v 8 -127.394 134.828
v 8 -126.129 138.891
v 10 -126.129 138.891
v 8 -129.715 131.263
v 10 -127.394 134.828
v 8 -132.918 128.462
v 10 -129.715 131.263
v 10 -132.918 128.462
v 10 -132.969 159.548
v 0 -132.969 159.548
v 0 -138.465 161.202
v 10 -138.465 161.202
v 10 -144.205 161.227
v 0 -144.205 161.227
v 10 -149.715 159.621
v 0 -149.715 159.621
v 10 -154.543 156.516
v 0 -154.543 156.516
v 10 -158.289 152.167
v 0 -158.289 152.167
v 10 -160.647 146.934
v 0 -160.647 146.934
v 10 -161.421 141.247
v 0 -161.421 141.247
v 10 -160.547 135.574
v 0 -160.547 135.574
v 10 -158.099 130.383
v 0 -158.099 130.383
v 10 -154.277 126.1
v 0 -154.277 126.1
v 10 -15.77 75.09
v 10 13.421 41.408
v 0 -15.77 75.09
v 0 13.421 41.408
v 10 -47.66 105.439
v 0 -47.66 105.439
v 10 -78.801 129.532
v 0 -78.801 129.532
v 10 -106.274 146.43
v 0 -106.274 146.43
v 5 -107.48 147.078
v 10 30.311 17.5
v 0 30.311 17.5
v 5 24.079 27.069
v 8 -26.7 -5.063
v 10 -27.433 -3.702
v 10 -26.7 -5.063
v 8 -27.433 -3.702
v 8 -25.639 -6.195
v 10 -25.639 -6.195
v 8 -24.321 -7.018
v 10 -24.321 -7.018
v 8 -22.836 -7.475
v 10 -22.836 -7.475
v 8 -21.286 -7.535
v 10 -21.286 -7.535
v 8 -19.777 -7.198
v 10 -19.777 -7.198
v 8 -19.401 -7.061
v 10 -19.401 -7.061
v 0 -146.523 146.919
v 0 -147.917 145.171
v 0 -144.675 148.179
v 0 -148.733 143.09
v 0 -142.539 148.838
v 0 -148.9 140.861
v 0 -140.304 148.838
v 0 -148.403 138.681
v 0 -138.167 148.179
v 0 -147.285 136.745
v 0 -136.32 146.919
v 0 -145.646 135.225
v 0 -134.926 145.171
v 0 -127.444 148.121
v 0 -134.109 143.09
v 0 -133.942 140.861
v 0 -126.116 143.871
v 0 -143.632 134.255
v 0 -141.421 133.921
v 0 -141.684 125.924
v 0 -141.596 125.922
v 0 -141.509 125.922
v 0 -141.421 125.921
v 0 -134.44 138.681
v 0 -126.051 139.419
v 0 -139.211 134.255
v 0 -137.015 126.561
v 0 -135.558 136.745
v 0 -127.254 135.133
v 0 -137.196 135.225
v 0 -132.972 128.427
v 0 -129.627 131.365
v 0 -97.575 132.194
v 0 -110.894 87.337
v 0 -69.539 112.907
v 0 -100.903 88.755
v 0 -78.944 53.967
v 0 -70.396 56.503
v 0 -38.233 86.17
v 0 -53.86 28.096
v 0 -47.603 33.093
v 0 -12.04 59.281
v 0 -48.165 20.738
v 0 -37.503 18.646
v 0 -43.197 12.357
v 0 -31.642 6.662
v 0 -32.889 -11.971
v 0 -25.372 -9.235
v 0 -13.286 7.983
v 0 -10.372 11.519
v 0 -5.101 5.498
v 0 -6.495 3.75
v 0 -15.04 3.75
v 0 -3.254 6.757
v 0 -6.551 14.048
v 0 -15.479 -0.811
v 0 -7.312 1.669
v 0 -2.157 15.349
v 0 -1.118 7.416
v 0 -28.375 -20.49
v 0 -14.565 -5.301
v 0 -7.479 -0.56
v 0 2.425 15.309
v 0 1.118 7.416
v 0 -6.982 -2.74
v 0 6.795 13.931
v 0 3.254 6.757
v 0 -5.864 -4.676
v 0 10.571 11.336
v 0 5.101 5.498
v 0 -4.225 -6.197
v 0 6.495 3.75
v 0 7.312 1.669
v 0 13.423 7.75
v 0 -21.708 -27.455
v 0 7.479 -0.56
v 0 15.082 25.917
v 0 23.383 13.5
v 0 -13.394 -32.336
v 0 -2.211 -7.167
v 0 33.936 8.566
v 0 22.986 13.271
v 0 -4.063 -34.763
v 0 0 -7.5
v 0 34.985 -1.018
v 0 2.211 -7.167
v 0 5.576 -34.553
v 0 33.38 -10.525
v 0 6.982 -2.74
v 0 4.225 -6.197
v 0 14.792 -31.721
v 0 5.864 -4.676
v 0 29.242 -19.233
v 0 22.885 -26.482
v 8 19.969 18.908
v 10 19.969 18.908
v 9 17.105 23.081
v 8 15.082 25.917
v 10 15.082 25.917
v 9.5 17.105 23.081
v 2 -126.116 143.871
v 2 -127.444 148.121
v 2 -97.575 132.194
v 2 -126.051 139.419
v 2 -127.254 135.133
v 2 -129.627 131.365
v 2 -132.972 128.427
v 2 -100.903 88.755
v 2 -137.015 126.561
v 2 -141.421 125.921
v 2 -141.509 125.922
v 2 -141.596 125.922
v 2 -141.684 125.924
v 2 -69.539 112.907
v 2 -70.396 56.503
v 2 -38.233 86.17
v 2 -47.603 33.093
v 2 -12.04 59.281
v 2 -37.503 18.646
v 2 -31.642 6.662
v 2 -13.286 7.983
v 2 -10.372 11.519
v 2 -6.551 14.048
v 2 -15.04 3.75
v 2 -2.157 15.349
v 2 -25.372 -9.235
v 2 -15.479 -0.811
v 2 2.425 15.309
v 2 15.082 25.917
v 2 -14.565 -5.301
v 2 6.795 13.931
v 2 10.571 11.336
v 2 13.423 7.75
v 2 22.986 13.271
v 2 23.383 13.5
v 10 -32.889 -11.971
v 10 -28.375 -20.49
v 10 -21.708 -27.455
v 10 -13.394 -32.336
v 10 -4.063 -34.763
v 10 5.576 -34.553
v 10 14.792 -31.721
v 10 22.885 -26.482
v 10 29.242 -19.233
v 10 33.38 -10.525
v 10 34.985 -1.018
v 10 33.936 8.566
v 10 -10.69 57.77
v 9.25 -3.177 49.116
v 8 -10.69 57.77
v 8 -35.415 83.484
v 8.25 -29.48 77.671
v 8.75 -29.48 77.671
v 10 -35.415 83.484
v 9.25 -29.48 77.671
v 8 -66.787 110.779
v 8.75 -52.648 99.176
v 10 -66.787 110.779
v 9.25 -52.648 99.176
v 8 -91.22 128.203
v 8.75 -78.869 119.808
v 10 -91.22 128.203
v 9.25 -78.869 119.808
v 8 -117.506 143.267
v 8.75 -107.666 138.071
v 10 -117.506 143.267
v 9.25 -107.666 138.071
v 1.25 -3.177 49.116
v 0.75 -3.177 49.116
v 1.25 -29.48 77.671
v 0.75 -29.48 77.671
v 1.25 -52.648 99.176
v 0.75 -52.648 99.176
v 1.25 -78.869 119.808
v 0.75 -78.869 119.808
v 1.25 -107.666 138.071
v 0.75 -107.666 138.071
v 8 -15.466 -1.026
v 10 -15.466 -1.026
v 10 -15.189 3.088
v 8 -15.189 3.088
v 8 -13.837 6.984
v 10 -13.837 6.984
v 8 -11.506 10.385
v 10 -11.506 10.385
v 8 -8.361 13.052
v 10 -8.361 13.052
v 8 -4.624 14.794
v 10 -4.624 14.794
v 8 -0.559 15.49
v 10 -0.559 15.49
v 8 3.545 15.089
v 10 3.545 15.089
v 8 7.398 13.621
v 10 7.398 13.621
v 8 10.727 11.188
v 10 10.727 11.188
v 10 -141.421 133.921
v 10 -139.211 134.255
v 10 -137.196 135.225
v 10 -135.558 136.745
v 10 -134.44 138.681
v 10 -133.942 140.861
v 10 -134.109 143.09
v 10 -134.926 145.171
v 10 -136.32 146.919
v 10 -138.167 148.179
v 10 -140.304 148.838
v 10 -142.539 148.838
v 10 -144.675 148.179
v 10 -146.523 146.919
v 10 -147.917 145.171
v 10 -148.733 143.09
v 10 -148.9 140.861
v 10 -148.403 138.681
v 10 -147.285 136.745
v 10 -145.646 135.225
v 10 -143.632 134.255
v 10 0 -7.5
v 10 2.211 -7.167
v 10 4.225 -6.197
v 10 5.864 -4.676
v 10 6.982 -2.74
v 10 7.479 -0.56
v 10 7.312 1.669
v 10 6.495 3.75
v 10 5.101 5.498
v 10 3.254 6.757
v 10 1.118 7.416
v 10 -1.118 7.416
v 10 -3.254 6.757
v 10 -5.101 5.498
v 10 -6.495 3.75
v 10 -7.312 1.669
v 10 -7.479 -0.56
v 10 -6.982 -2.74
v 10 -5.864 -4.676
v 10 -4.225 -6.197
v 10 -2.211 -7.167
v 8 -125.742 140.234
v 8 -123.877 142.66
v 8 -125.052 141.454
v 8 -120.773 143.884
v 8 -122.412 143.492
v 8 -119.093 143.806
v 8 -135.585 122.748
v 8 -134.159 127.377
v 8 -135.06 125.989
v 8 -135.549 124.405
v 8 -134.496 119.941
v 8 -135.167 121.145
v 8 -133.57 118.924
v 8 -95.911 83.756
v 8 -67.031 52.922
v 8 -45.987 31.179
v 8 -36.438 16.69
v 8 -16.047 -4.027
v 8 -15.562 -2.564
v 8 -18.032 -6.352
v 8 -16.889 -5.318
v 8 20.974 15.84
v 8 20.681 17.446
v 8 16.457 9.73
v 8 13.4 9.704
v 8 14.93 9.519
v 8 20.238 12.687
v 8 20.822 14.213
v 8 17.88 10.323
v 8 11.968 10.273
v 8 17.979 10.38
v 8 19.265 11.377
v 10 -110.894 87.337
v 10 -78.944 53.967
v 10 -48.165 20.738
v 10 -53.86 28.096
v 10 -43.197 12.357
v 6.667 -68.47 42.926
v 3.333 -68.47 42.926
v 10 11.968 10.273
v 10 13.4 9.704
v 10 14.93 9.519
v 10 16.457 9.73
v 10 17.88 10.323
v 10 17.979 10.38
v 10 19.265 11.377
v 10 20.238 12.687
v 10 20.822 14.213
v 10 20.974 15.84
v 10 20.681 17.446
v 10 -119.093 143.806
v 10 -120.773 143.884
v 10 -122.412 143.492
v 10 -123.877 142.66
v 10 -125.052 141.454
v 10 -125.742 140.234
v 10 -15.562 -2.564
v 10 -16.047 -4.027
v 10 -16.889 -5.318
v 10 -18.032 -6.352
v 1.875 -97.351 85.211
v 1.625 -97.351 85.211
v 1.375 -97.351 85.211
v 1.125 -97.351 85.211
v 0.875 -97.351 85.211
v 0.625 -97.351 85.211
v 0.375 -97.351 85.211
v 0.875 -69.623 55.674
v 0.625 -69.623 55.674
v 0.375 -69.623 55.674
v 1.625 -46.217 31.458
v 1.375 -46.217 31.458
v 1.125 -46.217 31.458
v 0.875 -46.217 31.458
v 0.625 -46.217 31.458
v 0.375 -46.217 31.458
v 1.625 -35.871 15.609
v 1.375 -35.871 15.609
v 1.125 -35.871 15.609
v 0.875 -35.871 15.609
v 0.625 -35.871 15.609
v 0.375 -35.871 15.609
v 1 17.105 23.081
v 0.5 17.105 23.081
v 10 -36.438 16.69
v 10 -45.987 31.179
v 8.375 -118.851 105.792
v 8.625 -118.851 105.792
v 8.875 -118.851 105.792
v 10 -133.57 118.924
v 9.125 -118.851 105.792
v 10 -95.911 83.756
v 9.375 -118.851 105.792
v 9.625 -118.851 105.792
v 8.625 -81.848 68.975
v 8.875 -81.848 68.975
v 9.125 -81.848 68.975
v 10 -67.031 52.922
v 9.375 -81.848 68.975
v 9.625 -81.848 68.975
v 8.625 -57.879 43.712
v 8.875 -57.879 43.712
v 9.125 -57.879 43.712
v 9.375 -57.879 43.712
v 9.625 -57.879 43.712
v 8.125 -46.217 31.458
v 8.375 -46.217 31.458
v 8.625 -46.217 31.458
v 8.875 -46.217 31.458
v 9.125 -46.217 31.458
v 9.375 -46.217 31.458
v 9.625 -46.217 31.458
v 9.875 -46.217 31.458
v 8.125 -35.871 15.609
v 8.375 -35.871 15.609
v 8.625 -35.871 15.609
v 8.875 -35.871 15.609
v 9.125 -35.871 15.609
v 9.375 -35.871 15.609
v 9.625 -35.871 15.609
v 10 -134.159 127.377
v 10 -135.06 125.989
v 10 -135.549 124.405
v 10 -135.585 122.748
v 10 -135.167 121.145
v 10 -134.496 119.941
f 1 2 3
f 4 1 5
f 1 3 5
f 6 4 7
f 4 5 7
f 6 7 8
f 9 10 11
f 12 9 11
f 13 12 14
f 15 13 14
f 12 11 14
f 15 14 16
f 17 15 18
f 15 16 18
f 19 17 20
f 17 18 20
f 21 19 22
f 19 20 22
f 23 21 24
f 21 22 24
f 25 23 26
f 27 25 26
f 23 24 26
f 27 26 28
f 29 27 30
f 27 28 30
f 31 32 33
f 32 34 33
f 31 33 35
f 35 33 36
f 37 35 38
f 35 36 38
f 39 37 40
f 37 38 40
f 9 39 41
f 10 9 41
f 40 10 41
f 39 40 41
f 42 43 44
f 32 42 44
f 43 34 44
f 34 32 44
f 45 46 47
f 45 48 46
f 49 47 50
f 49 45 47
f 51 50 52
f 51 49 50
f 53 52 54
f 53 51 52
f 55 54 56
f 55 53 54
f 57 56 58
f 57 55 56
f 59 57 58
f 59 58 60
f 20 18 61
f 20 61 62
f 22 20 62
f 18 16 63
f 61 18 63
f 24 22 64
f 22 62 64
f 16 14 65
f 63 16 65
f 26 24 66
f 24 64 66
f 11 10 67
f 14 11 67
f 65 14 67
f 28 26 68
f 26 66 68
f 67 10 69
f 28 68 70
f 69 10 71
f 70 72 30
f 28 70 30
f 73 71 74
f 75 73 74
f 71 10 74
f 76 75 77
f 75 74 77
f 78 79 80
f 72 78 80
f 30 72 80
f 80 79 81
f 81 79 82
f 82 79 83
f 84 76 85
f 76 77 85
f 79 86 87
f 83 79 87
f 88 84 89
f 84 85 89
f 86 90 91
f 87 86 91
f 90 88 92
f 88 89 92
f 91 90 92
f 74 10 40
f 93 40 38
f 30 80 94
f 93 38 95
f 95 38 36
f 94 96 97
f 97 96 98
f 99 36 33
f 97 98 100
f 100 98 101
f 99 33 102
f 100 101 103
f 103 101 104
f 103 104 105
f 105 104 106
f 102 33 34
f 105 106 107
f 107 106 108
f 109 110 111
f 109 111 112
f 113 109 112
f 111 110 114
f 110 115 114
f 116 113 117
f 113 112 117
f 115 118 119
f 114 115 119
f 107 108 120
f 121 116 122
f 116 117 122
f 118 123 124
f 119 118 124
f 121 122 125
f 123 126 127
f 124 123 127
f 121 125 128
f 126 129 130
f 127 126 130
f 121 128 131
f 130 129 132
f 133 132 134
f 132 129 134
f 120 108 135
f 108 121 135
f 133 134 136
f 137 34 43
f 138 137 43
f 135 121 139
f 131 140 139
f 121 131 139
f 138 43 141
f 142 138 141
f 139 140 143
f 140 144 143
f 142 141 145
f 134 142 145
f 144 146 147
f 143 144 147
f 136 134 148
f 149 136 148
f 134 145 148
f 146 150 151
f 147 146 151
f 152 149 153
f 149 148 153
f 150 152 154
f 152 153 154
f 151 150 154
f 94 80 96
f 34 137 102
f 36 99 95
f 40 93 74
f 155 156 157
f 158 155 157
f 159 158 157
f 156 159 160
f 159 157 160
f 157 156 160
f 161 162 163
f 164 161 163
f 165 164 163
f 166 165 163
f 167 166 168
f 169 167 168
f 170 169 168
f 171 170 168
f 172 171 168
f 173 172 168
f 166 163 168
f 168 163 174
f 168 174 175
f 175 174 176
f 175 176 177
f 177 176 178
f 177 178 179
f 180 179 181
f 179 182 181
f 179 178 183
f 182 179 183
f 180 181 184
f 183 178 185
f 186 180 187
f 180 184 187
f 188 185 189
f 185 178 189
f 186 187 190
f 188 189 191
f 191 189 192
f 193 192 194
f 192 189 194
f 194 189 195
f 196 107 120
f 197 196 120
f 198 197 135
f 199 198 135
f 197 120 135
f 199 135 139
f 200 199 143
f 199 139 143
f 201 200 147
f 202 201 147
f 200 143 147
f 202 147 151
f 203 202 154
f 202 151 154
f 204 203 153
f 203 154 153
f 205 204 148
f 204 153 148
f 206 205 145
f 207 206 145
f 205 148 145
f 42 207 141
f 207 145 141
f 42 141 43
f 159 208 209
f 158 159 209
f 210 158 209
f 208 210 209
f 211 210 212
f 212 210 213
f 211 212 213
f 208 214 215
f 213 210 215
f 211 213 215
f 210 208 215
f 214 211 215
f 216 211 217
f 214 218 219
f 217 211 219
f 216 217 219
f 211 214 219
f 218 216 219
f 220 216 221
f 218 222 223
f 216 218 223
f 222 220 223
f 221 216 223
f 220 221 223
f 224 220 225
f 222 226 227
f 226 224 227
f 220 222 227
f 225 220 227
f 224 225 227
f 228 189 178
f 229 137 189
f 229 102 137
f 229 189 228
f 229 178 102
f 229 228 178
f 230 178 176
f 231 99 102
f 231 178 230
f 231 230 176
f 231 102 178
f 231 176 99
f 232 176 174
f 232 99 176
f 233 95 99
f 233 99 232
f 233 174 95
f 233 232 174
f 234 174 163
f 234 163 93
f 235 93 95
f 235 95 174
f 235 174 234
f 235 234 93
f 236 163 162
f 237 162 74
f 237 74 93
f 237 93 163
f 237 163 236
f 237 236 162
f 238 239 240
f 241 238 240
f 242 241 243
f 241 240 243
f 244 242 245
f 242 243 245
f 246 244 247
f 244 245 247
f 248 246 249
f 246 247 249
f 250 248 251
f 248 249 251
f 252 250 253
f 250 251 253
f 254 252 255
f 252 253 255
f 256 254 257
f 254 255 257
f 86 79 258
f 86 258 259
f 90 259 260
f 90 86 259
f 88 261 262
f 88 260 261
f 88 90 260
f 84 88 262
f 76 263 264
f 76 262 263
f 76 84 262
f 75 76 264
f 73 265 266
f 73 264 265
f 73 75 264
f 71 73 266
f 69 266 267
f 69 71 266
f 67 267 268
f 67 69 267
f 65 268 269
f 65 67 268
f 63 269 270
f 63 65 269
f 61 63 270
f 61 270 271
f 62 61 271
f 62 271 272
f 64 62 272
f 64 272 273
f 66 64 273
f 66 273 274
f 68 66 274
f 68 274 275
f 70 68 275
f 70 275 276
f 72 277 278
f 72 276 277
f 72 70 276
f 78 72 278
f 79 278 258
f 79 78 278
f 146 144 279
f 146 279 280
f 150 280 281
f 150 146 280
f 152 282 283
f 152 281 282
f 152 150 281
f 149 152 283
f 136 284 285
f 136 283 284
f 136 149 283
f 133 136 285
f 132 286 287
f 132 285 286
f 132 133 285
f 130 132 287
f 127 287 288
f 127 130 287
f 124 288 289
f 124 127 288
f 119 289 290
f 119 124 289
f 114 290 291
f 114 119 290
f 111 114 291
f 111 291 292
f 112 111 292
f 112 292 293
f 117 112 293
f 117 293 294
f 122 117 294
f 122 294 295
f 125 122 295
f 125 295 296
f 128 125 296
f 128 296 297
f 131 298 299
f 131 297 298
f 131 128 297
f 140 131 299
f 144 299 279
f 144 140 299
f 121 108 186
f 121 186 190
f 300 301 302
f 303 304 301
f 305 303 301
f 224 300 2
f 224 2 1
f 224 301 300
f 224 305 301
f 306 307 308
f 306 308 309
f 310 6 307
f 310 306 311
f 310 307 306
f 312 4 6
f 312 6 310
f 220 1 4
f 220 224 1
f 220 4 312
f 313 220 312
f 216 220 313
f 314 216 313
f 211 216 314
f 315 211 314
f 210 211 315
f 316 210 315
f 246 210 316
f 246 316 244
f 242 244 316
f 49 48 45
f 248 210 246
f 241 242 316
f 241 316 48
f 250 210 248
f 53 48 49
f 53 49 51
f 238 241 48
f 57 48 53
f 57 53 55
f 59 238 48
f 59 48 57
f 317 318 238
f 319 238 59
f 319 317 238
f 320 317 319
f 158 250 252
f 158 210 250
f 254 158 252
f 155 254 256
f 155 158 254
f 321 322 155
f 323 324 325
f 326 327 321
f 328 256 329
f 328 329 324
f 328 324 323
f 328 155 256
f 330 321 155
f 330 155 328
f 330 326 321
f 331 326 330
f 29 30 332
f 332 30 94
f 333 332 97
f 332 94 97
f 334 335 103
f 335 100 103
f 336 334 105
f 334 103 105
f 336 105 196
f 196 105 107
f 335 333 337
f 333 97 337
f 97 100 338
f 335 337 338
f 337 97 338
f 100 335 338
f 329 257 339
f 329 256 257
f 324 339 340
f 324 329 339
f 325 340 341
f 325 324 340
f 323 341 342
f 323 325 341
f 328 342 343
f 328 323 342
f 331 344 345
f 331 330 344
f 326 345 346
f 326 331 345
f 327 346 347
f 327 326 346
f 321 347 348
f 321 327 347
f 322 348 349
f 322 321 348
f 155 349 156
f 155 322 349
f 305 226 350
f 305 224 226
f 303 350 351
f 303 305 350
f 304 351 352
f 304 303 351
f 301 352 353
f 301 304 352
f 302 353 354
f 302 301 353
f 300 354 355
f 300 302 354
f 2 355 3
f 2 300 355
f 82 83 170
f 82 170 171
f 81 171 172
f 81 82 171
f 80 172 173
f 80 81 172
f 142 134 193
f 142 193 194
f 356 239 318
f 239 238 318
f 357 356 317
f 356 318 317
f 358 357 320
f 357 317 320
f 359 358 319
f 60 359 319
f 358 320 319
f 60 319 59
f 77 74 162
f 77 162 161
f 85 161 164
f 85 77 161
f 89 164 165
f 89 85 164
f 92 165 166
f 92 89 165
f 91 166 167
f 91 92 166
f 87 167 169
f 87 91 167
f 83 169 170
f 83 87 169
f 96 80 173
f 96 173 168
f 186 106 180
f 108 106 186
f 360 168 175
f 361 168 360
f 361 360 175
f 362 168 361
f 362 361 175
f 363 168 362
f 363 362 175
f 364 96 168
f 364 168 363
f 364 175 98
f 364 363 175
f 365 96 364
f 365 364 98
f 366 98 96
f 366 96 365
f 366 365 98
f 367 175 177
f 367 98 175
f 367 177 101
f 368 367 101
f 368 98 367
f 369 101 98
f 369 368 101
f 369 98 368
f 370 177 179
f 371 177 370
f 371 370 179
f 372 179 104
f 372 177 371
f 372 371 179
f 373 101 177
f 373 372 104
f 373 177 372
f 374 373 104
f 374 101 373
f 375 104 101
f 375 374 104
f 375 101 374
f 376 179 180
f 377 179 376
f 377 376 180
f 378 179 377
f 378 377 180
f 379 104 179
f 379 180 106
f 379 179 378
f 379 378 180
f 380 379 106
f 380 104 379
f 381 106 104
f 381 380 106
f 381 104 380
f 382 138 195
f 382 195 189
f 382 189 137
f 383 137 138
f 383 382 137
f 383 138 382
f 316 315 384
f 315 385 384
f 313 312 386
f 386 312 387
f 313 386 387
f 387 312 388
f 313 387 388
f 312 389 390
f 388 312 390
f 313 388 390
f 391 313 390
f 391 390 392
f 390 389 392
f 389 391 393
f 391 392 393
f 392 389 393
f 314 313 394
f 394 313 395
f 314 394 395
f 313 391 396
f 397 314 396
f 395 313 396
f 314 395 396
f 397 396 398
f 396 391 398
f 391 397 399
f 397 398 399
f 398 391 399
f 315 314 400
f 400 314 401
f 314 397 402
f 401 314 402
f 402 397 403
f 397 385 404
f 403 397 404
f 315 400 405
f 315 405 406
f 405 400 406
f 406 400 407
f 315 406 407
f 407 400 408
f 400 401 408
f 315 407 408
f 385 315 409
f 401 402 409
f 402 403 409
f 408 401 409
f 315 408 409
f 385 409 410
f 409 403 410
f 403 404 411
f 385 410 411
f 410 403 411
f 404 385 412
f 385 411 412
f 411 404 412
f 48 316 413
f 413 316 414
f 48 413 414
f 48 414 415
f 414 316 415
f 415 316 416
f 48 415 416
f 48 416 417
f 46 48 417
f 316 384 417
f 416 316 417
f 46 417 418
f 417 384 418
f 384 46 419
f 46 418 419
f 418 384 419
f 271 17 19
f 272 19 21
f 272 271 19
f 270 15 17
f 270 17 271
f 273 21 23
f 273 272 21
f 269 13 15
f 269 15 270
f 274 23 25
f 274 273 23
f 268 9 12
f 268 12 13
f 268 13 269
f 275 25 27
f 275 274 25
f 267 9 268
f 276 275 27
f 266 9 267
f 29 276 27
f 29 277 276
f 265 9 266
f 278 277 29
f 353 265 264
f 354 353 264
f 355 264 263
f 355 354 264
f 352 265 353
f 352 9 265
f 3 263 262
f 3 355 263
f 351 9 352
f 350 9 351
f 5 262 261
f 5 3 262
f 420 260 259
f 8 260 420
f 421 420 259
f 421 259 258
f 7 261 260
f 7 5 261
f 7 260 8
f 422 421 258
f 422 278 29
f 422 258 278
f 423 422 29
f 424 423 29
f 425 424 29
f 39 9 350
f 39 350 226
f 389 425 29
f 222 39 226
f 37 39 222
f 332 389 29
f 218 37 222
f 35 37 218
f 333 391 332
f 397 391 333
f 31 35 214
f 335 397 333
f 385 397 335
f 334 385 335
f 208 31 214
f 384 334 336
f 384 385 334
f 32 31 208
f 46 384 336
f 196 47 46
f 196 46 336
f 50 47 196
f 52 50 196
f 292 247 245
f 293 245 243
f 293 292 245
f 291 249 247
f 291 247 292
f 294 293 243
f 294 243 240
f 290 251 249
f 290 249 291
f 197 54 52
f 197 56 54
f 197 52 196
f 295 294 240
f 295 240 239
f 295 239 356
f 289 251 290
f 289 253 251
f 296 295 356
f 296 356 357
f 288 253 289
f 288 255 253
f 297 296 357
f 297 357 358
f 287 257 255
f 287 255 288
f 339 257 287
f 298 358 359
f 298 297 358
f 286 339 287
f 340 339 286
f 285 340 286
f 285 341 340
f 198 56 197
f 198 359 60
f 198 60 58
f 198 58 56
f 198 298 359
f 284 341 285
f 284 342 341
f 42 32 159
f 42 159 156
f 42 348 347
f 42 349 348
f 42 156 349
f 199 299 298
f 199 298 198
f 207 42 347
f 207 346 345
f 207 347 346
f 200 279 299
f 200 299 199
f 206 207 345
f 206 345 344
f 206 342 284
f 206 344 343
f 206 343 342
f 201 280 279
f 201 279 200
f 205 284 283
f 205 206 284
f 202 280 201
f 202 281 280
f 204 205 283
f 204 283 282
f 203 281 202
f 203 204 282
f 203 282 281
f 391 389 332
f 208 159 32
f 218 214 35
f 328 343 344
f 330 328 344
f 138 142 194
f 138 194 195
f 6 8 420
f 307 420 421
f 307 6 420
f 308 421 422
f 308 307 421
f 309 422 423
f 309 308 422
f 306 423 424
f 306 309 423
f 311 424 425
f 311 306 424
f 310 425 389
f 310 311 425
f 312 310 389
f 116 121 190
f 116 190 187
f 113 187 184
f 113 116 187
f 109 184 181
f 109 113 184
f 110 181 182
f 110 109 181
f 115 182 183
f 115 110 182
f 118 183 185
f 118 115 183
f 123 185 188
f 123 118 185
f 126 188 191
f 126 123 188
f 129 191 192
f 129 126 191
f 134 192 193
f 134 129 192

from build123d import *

# Parameters (mm, degrees)
BOSS_EXTRUDE1_DEPTH     = 10
CUT_EXTRUDE1_DEPTH      = 229.503191587
CUT_EXTRUDE1_DEPTH_BACK = 229.503191587
SKETCH2_R               = 7.5
CUT_EXTRUDE4_DEPTH      = 2
FILLET3_R               = 6


with BuildPart() as part:
    # Sketch1 → Boss-Extrude1 (new body)
    with BuildSketch(Plane(origin=(0, 0, 0), x_dir=(0, 0, -1), z_dir=(1, 0, 0))):
        with BuildLine():
            ThreePointArc((11.970705016, -32.889241728), (31.720772546, 14.791639161), (-17.5, 30.310889132))
            add(Edge.make_bspline(
                [(-17.5, 30.310889132), (-34.321955695, 20.598728483), (-116.723953626, -40.410250972), (-156.313763477, -126.034194964), (-159.547511978, -132.968991002)],
                knots=[0, 0, 0, 0, 0.889912334, 1, 1, 1, 1], degree=3))
            ThreePointArc((-159.547511978, -132.968991002), (-152.167348404, -158.289185154), (-126.100467375, -154.277108431))
            add(Edge.make_bspline(
                [(-126.100467375, -154.277108431), (-80.64177253, -100.101545535), (-58.2293325, -84.719492888), (-25.919121569, -50.790307967), (-14.885033301, -42.663931094), (11.970705016, -32.889241728)],
                knots=[0, 0, 0, 0, 0.511217005, 0.600270542, 0.89053537, 0.89053537, 0.89053537, 0.89053537], degree=3))
        make_face()
    extrude(amount=BOSS_EXTRUDE1_DEPTH)

    # Sketch2 → Cut-Extrude1 (cut, two sides: drawn at the far end of the back side and taken through both)
    with BuildSketch(Plane(origin=(10, 0, 0), x_dir=(0, 0, -1), z_dir=(1, 0, 0)).offset(-CUT_EXTRUDE1_DEPTH_BACK)):
        Circle(SKETCH2_R)
        with Locations((-141.421356237, -141.421356237)):
            Circle(SKETCH2_R)
    extrude(amount=CUT_EXTRUDE1_DEPTH + CUT_EXTRUDE1_DEPTH_BACK, mode=Mode.SUBTRACT)

    # Sketch8 → Cut-Extrude4 (cut)
    with BuildSketch(Plane(origin=(10, 0, 0), x_dir=(0, 0, -1), z_dir=(1, 0, 0))):
        with BuildLine():
            ThreePointArc((5.301312222, -14.565235622), (-14.047770699, -6.550583057), (-7.75, 13.423393759))
            Line((-7.75, 13.423393759), (-13.270700045, 22.985526729))
            Line((-13.270700045, 22.985526729), (-13.5, 23.382685902))
            add(Edge.make_bspline(
                [(-13.5, 23.382685902), (-14.004264792, 23.091548489), (-14.596989898, 22.736556542), (-15.930761723, 21.910191472), (-16.672259928, 21.43865672), (-19.096143962, 19.858481722), (-20.97746579, 18.58453004), (-23.985838626, 16.468739554), (-24.932203297, 15.79405814), (-25.916949038, 15.082203502)],
                knots=[0, 0, 0, 0, 0.03125, 0.03125, 0.0625, 0.0625, 0.125, 0.125, 0.151902129, 0.151902129, 0.151902129, 0.151902129], degree=3))
            add(Edge.make_bspline(
                [(-25.916949038, 15.082203502), (-29.507797216, 12.4864452), (-33.608989313, 9.396403406), (-49.503275079, -3.177533176), (-63.377476055, -15.156595083), (-91.964800189, -43.803959857), (-106.678912673, -60.475554794), (-126.373284326, -88.065760368), (-132.542324418, -97.692221413), (-138.762340902, -108.912812223), (-139.443275699, -110.164633361), (-140.784992316, -112.680202379), (-141.44751941, -113.947019213), (-143.40368157, -117.749366226), (-144.665797353, -120.286656297), (-146.645761611, -124.353749783), (-147.397332853, -125.92044903), (-148.121316458, -127.444213001)],
                knots=[0.151902129, 0.151902129, 0.151902129, 0.151902129, 0.25, 0.25, 0.5, 0.5, 0.75, 0.75, 0.875, 0.875, 0.890625, 0.890625, 0.90625, 0.90625, 0.9375, 0.9375, 0.957617953, 0.957617953, 0.957617953, 0.957617953], degree=3))
            ThreePointArc((-148.121316458, -127.444213001), (-133.163008443, -128.304584847), (-125.921356237, -141.421356237))
            ThreePointArc((-125.921356237, -141.421356237), (-125.921911553, -141.552560245), (-125.923577462, -141.683754851))
            add(Edge.make_bspline(
                [(-125.923577462, -141.683754851), (-118.529925562, -133.022812133), (-111.861983926, -125.488119901), (-98.042519438, -110.377224048), (-91.266586508, -103.365591459), (-79.155605263, -91.336141526), (-73.820810692, -86.318727269), (-66.552703556, -79.612530547), (-64.252740209, -77.514005309), (-59.839444304, -73.477424972), (-57.726273613, -71.539479143), (-53.620860933, -67.706762992), (-51.628593649, -65.812039684), (-49.166594827, -63.393004096), (-48.676627606, -62.907593959), (-47.692724643, -61.92458048), (-47.198430387, -61.426856534), (-45.710588093, -59.921105575), (-44.712177008, -58.90055567), (-42.710952583, -56.857105325), (-41.708160185, -55.834215393), (-39.703469442, -53.815256413), (-38.703400895, -52.821019854), (-35.691473525, -49.90421685), (-33.653791845, -48.033660498), (-29.262128181, -44.400093328), (-26.909957963, -42.640832773), (-21.694579862, -39.210652351), (-18.834074142, -37.540197568), (-12.384697646, -34.20169183), (-8.795186024, -32.532039364), (-0.610596797, -29.072552339), (3.985554691, -27.282176582), (9.23454387, -25.371700761)],
                knots=[0.027086016, 0.027086016, 0.027086016, 0.027086016, 0.125, 0.125, 0.25, 0.25, 0.375, 0.375, 0.4375, 0.4375, 0.5, 0.5, 0.5625, 0.5625, 0.578125, 0.578125, 0.59375, 0.59375, 0.625, 0.625, 0.65625, 0.65625, 0.6875, 0.6875, 0.75, 0.75, 0.8125, 0.8125, 0.875, 0.875, 0.9375, 0.9375, 1, 1, 1, 1], degree=3))
            Line((9.23454387, -25.371700761), (5.301312222, -14.565235622))
        make_face()
    cut_extrude4 = extrude(amount=-CUT_EXTRUDE4_DEPTH, mode=Mode.SUBTRACT)

    # Fillet3
    fillet3_edges = [part.edges().sort_by_distance(p)[0] for p in [
        (9, -25.371700761, -9.23454387),
        (9, -14.565235622, -5.301312222),
        (9, 13.423393759, 7.75),
        (9, 23.382685902, 13.5),
        (9, -141.683754851, 125.923577462),
        (9, -127.444213001, 148.121316458),
    ]]
    fillet(fillet3_edges, radius=FILLET3_R)

    # Mirror1: Cut-Extrude4 across plane
    add(cut_extrude4.mirror(Plane(origin=(5, 0, 0), x_dir=(0, 0, 1), z_dir=(1, 0, 0))), mode=Mode.SUBTRACT)


solid = part.part
